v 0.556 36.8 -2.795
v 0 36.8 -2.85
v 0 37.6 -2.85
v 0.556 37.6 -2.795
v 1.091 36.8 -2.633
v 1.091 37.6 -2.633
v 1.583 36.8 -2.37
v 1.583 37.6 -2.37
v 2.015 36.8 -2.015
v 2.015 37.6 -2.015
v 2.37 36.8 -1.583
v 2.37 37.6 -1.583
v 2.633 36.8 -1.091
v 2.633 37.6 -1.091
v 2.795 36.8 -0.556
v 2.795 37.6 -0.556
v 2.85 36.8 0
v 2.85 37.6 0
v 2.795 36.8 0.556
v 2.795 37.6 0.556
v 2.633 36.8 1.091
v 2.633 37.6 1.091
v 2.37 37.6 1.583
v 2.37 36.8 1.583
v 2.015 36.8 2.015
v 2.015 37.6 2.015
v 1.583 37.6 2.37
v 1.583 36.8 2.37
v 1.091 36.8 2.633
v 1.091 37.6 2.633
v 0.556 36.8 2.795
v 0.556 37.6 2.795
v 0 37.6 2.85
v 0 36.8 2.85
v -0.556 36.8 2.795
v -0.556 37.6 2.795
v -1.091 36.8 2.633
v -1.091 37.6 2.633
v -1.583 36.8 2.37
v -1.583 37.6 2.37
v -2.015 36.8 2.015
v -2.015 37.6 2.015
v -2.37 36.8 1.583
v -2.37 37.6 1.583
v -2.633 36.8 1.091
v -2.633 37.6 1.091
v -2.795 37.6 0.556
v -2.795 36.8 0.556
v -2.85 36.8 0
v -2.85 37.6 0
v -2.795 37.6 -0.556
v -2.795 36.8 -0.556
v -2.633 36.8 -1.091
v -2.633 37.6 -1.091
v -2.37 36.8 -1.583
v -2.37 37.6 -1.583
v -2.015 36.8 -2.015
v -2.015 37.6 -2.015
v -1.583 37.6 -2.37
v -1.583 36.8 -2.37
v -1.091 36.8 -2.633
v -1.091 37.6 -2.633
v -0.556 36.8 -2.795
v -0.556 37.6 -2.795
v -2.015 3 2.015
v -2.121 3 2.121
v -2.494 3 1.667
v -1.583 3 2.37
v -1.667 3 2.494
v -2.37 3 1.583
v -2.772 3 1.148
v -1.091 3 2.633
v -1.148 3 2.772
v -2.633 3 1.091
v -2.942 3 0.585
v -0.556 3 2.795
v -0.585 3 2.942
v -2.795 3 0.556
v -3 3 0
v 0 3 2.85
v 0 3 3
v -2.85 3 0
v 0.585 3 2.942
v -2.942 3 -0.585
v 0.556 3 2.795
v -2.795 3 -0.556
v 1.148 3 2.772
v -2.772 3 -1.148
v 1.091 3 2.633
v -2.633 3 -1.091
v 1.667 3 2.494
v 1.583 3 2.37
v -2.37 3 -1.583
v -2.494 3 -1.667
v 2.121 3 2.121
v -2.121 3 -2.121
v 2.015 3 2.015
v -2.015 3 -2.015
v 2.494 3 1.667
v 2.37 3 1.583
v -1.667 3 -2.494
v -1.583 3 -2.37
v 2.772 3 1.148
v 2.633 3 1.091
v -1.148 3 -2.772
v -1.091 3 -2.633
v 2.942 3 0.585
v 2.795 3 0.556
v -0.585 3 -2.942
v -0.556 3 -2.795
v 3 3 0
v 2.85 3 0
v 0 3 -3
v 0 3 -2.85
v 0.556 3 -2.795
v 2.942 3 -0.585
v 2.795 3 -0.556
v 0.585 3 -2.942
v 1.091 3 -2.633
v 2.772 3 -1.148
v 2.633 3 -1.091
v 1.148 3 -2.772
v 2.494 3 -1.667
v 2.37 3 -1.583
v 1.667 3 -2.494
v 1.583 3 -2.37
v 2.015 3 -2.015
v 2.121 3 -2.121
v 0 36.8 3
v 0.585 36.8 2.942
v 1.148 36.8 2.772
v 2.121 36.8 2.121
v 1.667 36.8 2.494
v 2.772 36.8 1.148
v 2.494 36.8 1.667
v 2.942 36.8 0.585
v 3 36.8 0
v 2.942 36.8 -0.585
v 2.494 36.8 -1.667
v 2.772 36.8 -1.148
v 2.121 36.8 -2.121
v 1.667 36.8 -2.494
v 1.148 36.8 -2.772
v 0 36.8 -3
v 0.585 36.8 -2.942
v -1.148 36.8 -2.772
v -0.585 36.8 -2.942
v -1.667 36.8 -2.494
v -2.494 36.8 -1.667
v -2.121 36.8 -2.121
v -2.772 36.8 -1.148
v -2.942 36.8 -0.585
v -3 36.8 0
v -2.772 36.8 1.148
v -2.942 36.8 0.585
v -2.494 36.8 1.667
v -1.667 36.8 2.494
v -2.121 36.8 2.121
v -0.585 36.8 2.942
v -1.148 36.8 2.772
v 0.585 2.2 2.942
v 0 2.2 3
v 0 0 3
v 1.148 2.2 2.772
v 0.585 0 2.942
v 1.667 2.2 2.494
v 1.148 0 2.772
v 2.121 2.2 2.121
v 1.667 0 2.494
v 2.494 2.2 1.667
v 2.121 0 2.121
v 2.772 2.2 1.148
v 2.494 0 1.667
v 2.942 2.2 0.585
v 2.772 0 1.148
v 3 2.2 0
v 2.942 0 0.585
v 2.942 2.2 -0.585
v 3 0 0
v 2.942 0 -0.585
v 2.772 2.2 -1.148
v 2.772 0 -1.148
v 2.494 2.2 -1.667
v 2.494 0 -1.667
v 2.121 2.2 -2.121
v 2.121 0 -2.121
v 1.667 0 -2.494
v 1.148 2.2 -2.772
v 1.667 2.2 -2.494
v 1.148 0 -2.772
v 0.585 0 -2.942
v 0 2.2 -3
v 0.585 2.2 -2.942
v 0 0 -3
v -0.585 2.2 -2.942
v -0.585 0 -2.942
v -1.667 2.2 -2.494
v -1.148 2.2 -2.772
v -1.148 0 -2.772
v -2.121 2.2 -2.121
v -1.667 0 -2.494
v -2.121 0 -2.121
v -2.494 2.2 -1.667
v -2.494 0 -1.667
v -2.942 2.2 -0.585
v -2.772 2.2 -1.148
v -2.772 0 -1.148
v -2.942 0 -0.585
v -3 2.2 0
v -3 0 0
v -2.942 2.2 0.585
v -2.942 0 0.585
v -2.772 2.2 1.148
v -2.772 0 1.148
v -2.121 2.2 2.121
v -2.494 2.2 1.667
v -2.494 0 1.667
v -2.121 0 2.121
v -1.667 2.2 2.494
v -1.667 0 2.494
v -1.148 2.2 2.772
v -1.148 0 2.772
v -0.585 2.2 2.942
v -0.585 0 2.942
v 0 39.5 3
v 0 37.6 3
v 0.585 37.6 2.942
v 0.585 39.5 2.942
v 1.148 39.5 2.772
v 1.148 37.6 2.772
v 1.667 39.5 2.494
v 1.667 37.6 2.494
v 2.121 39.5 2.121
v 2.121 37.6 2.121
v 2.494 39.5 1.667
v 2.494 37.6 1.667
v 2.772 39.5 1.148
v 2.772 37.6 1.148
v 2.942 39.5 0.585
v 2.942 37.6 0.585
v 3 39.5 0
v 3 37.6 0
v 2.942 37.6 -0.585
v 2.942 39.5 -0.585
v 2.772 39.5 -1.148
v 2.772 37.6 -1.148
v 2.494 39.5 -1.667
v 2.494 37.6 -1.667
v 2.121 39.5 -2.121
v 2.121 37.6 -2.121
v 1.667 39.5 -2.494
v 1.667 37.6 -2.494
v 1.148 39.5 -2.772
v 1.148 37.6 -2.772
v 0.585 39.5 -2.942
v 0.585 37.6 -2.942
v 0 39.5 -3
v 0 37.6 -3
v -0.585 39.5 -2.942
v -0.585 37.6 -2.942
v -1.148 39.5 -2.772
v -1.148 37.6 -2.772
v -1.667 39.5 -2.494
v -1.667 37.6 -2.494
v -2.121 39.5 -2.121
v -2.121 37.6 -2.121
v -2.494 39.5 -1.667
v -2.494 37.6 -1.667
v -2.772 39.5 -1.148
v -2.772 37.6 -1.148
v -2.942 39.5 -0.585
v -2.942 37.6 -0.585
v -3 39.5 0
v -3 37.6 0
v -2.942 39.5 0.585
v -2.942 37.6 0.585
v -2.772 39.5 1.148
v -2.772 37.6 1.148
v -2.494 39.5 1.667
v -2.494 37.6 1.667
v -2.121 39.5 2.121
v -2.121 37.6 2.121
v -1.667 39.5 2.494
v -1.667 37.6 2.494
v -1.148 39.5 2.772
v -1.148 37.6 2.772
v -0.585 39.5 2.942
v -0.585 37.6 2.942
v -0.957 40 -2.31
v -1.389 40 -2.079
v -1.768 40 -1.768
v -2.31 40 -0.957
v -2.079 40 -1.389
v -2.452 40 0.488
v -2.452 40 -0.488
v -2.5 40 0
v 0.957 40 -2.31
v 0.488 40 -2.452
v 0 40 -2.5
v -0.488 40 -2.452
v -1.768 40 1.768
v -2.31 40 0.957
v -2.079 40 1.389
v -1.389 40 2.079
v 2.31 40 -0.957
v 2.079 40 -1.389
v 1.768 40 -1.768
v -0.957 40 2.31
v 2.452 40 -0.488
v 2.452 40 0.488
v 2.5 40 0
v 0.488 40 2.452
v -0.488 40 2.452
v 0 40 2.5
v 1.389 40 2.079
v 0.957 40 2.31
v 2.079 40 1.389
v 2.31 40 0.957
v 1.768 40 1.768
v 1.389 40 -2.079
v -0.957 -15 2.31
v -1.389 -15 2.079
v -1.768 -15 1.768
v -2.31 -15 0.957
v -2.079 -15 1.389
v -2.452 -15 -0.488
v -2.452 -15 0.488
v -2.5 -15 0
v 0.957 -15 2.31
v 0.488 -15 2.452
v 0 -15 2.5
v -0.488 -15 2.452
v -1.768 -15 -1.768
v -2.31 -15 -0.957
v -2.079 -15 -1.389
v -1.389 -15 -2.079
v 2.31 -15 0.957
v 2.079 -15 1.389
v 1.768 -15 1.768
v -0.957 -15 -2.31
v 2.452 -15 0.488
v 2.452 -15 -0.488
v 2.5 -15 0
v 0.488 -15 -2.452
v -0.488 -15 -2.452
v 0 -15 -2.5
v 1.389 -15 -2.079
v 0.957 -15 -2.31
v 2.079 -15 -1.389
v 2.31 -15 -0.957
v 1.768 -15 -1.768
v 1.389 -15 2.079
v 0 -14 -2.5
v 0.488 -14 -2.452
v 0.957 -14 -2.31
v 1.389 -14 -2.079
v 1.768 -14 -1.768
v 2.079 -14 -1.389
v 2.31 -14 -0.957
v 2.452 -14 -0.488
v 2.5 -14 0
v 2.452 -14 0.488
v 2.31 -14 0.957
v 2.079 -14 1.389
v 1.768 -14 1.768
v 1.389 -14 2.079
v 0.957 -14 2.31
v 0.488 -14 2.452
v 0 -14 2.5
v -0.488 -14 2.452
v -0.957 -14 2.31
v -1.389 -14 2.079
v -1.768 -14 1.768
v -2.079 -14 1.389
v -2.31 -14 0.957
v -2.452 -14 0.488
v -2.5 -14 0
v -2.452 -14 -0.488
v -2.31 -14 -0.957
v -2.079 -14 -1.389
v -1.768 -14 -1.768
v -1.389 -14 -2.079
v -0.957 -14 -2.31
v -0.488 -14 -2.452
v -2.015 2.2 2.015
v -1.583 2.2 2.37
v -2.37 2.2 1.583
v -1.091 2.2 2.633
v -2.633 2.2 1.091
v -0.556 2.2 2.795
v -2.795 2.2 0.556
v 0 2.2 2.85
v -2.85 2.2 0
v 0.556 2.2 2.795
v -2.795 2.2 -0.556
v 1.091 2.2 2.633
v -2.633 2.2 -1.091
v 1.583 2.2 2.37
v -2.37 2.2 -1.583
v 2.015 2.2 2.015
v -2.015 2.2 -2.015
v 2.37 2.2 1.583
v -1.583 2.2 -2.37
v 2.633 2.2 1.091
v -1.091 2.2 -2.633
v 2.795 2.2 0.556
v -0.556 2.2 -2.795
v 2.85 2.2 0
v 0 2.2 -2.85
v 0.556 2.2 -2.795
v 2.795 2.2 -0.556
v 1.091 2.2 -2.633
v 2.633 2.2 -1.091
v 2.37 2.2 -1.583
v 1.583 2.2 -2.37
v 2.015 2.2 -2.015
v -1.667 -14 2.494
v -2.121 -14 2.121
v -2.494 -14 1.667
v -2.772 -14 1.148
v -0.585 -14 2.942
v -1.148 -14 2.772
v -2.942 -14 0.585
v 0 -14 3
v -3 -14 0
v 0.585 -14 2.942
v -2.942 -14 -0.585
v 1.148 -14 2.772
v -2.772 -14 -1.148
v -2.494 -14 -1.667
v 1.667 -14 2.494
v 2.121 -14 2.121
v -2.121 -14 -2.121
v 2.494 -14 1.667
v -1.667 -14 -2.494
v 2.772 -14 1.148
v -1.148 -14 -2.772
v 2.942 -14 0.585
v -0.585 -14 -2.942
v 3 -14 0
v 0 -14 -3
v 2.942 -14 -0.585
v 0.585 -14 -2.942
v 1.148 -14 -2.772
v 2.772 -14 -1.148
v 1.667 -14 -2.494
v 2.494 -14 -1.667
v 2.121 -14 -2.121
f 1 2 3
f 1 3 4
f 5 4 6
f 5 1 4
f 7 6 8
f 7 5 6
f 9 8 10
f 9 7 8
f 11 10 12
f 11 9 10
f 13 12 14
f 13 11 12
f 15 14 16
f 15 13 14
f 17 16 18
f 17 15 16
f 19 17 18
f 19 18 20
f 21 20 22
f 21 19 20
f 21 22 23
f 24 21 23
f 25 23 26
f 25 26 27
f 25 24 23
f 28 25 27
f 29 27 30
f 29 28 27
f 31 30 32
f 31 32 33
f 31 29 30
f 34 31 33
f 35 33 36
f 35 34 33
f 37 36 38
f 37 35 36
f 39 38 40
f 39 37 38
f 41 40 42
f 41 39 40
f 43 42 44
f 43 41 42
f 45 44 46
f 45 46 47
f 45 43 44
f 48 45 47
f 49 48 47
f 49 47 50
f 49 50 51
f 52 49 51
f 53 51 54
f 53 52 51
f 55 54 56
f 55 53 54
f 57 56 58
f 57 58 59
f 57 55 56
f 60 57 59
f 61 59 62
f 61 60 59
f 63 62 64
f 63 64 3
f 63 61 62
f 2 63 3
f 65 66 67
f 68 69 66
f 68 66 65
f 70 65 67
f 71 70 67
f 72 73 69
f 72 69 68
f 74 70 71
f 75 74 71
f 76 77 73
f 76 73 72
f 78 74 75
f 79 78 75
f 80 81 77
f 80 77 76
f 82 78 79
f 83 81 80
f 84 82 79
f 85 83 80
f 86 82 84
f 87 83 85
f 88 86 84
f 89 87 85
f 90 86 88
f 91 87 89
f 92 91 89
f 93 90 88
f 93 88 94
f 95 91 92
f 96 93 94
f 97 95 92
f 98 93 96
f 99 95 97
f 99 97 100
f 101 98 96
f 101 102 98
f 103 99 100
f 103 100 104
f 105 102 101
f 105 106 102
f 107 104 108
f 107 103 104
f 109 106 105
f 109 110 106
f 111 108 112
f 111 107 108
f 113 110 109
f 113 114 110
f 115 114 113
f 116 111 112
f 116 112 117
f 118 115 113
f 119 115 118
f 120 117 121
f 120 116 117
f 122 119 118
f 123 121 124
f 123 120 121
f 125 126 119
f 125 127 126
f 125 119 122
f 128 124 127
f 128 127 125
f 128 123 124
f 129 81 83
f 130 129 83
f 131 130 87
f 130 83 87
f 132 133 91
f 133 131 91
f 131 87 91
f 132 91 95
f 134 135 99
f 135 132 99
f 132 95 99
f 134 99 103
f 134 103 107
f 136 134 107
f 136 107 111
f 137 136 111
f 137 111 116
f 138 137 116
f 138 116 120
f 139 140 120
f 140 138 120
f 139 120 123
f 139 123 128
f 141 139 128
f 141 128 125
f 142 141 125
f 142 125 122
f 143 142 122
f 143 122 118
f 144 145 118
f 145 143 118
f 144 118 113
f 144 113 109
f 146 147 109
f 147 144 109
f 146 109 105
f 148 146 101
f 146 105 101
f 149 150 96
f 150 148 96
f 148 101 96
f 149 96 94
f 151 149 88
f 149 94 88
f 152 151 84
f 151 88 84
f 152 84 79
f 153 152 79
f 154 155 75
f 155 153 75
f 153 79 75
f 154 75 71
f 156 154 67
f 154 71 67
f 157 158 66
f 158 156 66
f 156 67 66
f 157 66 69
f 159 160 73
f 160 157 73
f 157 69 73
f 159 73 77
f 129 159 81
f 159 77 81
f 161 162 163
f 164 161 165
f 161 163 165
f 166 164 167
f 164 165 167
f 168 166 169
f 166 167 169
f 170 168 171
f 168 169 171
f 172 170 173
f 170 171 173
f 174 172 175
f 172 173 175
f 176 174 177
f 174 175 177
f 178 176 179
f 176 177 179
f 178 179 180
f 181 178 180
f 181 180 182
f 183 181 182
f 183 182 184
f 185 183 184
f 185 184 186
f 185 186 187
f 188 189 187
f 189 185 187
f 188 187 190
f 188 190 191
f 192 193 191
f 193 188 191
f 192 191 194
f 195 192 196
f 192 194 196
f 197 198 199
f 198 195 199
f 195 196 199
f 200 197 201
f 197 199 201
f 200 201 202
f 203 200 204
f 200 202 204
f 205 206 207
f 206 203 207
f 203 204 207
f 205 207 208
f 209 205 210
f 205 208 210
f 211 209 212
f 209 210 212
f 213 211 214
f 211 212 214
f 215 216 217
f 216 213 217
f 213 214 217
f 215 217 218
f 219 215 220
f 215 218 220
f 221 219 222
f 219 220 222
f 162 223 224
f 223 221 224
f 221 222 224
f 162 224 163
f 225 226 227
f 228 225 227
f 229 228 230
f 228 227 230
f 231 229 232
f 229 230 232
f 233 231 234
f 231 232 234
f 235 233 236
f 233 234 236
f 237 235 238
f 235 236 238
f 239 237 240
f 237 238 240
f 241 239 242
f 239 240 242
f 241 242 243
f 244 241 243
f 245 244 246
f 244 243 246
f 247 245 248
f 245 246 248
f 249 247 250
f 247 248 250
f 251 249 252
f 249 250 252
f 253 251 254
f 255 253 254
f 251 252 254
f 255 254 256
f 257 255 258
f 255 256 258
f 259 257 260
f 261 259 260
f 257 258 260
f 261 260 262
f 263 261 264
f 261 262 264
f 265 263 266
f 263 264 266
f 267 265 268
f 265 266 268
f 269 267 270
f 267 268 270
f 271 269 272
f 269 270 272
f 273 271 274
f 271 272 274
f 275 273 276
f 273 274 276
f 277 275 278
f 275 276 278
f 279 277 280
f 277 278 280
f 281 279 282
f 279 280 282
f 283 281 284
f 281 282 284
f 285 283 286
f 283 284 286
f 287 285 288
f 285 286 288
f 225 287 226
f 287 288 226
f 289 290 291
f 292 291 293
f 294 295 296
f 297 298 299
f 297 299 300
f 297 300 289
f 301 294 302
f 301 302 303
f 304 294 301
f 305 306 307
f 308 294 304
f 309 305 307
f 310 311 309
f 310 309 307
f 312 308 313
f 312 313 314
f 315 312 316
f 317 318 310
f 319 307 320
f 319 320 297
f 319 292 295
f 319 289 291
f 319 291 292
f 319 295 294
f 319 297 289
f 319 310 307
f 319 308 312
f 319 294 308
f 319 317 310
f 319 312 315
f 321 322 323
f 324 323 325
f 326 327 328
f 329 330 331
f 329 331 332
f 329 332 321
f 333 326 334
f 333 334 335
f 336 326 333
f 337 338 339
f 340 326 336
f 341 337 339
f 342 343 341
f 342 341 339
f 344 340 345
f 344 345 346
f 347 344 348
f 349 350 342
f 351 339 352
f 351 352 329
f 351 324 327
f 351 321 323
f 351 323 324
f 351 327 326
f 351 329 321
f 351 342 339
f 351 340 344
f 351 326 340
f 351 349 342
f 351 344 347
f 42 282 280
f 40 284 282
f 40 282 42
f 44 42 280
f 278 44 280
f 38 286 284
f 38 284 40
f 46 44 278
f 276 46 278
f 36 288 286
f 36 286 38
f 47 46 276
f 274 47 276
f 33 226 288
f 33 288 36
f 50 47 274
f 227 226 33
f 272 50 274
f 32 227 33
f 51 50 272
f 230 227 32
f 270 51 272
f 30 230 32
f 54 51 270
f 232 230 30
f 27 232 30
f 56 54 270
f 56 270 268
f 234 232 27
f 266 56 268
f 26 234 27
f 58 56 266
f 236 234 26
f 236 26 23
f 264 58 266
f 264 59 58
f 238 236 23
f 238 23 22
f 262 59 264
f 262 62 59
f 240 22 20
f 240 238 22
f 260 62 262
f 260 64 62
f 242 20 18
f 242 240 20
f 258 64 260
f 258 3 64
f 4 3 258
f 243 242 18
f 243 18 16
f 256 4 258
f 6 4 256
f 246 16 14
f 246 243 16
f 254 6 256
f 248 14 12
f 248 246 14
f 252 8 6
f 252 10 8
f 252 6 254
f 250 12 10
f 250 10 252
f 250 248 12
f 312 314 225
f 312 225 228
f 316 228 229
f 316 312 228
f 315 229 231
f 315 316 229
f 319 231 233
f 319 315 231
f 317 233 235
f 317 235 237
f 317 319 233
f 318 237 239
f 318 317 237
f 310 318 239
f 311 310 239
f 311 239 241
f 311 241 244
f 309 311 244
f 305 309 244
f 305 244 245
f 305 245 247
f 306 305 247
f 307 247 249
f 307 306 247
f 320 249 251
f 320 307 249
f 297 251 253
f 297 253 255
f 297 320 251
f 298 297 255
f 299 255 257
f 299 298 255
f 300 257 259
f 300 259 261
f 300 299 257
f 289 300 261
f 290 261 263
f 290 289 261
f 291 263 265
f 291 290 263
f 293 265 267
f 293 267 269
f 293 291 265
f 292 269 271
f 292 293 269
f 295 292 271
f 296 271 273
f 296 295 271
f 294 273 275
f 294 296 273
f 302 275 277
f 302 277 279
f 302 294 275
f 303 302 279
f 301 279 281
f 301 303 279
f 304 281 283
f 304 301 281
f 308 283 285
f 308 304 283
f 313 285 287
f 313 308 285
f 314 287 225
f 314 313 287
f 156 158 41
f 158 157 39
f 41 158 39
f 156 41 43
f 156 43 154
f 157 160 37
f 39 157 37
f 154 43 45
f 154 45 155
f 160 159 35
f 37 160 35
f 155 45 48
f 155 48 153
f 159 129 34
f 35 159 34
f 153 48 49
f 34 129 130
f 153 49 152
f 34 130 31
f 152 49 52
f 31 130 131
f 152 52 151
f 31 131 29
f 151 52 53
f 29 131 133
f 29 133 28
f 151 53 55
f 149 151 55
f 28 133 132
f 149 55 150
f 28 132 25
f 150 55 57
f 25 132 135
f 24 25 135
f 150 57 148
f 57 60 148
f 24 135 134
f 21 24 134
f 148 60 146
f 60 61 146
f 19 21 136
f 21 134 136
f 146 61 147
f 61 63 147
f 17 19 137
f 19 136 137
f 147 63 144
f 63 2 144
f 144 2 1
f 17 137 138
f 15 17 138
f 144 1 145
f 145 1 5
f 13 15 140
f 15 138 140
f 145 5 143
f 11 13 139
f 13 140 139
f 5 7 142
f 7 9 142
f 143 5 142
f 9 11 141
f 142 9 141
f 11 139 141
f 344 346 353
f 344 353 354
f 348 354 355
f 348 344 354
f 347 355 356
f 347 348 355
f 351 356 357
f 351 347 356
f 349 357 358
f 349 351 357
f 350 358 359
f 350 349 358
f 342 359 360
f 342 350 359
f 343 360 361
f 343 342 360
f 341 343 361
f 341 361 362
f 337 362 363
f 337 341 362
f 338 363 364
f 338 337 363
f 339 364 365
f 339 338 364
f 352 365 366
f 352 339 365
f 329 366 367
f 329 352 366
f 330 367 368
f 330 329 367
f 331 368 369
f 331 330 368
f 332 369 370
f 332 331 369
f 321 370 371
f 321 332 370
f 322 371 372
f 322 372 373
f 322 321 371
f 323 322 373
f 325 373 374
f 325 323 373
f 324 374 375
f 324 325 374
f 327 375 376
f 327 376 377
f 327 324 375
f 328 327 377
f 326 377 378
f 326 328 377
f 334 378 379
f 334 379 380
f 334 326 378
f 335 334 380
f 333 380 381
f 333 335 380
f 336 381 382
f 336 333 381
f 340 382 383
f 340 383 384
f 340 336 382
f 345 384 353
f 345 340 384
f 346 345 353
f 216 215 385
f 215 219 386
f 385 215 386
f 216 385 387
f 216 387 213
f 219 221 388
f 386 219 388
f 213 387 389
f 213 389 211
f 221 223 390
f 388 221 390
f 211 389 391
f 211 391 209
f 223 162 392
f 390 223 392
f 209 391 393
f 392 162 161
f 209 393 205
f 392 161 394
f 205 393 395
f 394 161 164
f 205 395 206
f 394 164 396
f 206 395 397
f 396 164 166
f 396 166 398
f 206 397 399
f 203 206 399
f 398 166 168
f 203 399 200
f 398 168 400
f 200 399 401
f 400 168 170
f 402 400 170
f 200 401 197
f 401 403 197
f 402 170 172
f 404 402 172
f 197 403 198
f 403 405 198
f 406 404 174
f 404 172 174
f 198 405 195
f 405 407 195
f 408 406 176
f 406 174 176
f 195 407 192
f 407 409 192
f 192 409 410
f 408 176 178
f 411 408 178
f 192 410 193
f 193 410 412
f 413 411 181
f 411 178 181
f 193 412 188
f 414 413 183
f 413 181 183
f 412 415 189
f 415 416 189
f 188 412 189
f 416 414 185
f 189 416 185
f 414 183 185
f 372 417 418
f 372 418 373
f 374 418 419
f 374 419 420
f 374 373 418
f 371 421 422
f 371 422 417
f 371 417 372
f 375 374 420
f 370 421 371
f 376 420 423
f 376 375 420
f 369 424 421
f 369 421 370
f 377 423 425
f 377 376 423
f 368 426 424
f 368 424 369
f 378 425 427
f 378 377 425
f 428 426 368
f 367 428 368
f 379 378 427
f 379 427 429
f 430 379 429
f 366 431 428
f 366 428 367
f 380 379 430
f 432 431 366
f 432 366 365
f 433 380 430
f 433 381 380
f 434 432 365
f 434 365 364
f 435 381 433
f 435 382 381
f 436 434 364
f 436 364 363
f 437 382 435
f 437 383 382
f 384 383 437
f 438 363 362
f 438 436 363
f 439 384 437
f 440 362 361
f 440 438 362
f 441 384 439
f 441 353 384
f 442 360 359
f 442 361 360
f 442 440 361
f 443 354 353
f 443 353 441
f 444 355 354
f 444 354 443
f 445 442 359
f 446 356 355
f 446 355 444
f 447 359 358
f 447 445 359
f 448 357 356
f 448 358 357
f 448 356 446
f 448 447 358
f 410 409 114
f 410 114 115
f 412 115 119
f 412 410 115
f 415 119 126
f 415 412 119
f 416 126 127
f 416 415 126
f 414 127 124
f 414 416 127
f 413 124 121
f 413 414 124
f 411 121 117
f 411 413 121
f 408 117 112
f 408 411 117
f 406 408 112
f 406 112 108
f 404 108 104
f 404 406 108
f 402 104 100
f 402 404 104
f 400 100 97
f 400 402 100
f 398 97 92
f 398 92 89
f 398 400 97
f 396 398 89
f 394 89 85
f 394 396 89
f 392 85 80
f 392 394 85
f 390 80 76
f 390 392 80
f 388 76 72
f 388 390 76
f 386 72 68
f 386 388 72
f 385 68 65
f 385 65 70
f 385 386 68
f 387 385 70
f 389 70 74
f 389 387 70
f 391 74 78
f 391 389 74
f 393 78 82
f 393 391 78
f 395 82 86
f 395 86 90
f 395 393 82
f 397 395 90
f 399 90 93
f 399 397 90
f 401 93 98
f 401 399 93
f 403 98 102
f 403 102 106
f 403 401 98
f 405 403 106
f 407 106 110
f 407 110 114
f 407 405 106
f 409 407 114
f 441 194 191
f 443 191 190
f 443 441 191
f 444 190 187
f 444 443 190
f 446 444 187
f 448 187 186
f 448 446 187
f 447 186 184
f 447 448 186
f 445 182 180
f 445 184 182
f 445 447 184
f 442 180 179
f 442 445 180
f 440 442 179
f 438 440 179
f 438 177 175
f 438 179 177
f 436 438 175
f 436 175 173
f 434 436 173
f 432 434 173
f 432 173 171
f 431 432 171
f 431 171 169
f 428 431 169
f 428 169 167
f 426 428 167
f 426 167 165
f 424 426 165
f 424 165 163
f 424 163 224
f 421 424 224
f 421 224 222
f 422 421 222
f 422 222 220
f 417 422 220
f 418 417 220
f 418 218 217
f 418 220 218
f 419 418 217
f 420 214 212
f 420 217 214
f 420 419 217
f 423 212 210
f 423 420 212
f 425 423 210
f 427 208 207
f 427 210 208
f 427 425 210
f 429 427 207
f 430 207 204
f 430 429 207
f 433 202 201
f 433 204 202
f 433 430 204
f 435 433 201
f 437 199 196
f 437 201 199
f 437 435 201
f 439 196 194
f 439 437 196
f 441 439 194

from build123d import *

# Parameters (mm, degrees)
SKETCH1_R           = 3
BOSS_EXTRUDE1_DEPTH = 40
CUT_EXTRUDE1_START  = 3.2
SKETCH2_R           = 3
SKETCH2_R_2         = 2.85
CUT_EXTRUDE1_DEPTH  = 0.8
CUT_EXTRUDE2_START  = -2.2
SKETCH3_R           = 3
SKETCH3_R_2         = 2.85
CUT_EXTRUDE2_DEPTH  = 0.8
CHAMFER1_SIZE       = 0.5
BOSS_EXTRUDE2_START = 15
SKETCH4_R           = 3
BOSS_EXTRUDE2_DEPTH = 15
SKETCH5_R           = 3
SKETCH5_R_2         = 2.5
CUT_EXTRUDE3_DEPTH  = 1


with BuildPart() as part:
    # Sketch1 → Boss-Extrude1 (new body)
    with BuildSketch(Plane(origin=(0, 0, 0), x_dir=(1, 0, 0), z_dir=(0, 1, 0))):
        with Locations(Location((0, 0, 0), (0, 0, 270))):
            Circle(SKETCH1_R)
    extrude(amount=BOSS_EXTRUDE1_DEPTH)

    # Sketch2 → Cut-Extrude1 (cut)
    with BuildSketch(Plane.XZ.offset(-40).offset(CUT_EXTRUDE1_START)):
        with Locations(Location((0, 0, 0), (0, 0, 270))):
            Circle(SKETCH2_R)
        with Locations(Location((0, 0, 0), (0, 0, 270))):
            Circle(SKETCH2_R_2, mode=Mode.SUBTRACT)
    extrude(amount=-CUT_EXTRUDE1_DEPTH, mode=Mode.SUBTRACT)

    # Sketch3 → Cut-Extrude2 (cut)
    with BuildSketch(Plane.XZ.offset(CUT_EXTRUDE2_START)):
        with Locations(Location((0, 0, 0), (0, 0, 270))):
            Circle(SKETCH3_R)
        with Locations(Location((0, 0, 0), (0, 0, 270))):
            Circle(SKETCH3_R_2, mode=Mode.SUBTRACT)
    extrude(amount=-CUT_EXTRUDE2_DEPTH, mode=Mode.SUBTRACT)

    # Chamfer1
    chamfer1_edges = [part.edges().sort_by_distance(p)[0] for p in [
        (0, 40, -3),
    ]]
    chamfer(chamfer1_edges, length=CHAMFER1_SIZE)

    # Sketch4 → Boss-Extrude2 (add)
    with BuildSketch(Plane.XZ.offset(BOSS_EXTRUDE2_START)):
        with Locations(Location((0, 0, 0), (0, 0, 270))):
            Circle(SKETCH4_R)
    extrude(amount=-BOSS_EXTRUDE2_DEPTH)

    # Sketch5 → Cut-Extrude3 (cut)
    with BuildSketch(Plane.XZ.offset(15)):
        with Locations(Location((0, 0, 0), (0, 0, 270))):
            Circle(SKETCH5_R)
        with Locations(Location((0, 0, 0), (0, 0, 270))):
            Circle(SKETCH5_R_2, mode=Mode.SUBTRACT)
    extrude(amount=-CUT_EXTRUDE3_DEPTH, mode=Mode.SUBTRACT)


solid = part.part
